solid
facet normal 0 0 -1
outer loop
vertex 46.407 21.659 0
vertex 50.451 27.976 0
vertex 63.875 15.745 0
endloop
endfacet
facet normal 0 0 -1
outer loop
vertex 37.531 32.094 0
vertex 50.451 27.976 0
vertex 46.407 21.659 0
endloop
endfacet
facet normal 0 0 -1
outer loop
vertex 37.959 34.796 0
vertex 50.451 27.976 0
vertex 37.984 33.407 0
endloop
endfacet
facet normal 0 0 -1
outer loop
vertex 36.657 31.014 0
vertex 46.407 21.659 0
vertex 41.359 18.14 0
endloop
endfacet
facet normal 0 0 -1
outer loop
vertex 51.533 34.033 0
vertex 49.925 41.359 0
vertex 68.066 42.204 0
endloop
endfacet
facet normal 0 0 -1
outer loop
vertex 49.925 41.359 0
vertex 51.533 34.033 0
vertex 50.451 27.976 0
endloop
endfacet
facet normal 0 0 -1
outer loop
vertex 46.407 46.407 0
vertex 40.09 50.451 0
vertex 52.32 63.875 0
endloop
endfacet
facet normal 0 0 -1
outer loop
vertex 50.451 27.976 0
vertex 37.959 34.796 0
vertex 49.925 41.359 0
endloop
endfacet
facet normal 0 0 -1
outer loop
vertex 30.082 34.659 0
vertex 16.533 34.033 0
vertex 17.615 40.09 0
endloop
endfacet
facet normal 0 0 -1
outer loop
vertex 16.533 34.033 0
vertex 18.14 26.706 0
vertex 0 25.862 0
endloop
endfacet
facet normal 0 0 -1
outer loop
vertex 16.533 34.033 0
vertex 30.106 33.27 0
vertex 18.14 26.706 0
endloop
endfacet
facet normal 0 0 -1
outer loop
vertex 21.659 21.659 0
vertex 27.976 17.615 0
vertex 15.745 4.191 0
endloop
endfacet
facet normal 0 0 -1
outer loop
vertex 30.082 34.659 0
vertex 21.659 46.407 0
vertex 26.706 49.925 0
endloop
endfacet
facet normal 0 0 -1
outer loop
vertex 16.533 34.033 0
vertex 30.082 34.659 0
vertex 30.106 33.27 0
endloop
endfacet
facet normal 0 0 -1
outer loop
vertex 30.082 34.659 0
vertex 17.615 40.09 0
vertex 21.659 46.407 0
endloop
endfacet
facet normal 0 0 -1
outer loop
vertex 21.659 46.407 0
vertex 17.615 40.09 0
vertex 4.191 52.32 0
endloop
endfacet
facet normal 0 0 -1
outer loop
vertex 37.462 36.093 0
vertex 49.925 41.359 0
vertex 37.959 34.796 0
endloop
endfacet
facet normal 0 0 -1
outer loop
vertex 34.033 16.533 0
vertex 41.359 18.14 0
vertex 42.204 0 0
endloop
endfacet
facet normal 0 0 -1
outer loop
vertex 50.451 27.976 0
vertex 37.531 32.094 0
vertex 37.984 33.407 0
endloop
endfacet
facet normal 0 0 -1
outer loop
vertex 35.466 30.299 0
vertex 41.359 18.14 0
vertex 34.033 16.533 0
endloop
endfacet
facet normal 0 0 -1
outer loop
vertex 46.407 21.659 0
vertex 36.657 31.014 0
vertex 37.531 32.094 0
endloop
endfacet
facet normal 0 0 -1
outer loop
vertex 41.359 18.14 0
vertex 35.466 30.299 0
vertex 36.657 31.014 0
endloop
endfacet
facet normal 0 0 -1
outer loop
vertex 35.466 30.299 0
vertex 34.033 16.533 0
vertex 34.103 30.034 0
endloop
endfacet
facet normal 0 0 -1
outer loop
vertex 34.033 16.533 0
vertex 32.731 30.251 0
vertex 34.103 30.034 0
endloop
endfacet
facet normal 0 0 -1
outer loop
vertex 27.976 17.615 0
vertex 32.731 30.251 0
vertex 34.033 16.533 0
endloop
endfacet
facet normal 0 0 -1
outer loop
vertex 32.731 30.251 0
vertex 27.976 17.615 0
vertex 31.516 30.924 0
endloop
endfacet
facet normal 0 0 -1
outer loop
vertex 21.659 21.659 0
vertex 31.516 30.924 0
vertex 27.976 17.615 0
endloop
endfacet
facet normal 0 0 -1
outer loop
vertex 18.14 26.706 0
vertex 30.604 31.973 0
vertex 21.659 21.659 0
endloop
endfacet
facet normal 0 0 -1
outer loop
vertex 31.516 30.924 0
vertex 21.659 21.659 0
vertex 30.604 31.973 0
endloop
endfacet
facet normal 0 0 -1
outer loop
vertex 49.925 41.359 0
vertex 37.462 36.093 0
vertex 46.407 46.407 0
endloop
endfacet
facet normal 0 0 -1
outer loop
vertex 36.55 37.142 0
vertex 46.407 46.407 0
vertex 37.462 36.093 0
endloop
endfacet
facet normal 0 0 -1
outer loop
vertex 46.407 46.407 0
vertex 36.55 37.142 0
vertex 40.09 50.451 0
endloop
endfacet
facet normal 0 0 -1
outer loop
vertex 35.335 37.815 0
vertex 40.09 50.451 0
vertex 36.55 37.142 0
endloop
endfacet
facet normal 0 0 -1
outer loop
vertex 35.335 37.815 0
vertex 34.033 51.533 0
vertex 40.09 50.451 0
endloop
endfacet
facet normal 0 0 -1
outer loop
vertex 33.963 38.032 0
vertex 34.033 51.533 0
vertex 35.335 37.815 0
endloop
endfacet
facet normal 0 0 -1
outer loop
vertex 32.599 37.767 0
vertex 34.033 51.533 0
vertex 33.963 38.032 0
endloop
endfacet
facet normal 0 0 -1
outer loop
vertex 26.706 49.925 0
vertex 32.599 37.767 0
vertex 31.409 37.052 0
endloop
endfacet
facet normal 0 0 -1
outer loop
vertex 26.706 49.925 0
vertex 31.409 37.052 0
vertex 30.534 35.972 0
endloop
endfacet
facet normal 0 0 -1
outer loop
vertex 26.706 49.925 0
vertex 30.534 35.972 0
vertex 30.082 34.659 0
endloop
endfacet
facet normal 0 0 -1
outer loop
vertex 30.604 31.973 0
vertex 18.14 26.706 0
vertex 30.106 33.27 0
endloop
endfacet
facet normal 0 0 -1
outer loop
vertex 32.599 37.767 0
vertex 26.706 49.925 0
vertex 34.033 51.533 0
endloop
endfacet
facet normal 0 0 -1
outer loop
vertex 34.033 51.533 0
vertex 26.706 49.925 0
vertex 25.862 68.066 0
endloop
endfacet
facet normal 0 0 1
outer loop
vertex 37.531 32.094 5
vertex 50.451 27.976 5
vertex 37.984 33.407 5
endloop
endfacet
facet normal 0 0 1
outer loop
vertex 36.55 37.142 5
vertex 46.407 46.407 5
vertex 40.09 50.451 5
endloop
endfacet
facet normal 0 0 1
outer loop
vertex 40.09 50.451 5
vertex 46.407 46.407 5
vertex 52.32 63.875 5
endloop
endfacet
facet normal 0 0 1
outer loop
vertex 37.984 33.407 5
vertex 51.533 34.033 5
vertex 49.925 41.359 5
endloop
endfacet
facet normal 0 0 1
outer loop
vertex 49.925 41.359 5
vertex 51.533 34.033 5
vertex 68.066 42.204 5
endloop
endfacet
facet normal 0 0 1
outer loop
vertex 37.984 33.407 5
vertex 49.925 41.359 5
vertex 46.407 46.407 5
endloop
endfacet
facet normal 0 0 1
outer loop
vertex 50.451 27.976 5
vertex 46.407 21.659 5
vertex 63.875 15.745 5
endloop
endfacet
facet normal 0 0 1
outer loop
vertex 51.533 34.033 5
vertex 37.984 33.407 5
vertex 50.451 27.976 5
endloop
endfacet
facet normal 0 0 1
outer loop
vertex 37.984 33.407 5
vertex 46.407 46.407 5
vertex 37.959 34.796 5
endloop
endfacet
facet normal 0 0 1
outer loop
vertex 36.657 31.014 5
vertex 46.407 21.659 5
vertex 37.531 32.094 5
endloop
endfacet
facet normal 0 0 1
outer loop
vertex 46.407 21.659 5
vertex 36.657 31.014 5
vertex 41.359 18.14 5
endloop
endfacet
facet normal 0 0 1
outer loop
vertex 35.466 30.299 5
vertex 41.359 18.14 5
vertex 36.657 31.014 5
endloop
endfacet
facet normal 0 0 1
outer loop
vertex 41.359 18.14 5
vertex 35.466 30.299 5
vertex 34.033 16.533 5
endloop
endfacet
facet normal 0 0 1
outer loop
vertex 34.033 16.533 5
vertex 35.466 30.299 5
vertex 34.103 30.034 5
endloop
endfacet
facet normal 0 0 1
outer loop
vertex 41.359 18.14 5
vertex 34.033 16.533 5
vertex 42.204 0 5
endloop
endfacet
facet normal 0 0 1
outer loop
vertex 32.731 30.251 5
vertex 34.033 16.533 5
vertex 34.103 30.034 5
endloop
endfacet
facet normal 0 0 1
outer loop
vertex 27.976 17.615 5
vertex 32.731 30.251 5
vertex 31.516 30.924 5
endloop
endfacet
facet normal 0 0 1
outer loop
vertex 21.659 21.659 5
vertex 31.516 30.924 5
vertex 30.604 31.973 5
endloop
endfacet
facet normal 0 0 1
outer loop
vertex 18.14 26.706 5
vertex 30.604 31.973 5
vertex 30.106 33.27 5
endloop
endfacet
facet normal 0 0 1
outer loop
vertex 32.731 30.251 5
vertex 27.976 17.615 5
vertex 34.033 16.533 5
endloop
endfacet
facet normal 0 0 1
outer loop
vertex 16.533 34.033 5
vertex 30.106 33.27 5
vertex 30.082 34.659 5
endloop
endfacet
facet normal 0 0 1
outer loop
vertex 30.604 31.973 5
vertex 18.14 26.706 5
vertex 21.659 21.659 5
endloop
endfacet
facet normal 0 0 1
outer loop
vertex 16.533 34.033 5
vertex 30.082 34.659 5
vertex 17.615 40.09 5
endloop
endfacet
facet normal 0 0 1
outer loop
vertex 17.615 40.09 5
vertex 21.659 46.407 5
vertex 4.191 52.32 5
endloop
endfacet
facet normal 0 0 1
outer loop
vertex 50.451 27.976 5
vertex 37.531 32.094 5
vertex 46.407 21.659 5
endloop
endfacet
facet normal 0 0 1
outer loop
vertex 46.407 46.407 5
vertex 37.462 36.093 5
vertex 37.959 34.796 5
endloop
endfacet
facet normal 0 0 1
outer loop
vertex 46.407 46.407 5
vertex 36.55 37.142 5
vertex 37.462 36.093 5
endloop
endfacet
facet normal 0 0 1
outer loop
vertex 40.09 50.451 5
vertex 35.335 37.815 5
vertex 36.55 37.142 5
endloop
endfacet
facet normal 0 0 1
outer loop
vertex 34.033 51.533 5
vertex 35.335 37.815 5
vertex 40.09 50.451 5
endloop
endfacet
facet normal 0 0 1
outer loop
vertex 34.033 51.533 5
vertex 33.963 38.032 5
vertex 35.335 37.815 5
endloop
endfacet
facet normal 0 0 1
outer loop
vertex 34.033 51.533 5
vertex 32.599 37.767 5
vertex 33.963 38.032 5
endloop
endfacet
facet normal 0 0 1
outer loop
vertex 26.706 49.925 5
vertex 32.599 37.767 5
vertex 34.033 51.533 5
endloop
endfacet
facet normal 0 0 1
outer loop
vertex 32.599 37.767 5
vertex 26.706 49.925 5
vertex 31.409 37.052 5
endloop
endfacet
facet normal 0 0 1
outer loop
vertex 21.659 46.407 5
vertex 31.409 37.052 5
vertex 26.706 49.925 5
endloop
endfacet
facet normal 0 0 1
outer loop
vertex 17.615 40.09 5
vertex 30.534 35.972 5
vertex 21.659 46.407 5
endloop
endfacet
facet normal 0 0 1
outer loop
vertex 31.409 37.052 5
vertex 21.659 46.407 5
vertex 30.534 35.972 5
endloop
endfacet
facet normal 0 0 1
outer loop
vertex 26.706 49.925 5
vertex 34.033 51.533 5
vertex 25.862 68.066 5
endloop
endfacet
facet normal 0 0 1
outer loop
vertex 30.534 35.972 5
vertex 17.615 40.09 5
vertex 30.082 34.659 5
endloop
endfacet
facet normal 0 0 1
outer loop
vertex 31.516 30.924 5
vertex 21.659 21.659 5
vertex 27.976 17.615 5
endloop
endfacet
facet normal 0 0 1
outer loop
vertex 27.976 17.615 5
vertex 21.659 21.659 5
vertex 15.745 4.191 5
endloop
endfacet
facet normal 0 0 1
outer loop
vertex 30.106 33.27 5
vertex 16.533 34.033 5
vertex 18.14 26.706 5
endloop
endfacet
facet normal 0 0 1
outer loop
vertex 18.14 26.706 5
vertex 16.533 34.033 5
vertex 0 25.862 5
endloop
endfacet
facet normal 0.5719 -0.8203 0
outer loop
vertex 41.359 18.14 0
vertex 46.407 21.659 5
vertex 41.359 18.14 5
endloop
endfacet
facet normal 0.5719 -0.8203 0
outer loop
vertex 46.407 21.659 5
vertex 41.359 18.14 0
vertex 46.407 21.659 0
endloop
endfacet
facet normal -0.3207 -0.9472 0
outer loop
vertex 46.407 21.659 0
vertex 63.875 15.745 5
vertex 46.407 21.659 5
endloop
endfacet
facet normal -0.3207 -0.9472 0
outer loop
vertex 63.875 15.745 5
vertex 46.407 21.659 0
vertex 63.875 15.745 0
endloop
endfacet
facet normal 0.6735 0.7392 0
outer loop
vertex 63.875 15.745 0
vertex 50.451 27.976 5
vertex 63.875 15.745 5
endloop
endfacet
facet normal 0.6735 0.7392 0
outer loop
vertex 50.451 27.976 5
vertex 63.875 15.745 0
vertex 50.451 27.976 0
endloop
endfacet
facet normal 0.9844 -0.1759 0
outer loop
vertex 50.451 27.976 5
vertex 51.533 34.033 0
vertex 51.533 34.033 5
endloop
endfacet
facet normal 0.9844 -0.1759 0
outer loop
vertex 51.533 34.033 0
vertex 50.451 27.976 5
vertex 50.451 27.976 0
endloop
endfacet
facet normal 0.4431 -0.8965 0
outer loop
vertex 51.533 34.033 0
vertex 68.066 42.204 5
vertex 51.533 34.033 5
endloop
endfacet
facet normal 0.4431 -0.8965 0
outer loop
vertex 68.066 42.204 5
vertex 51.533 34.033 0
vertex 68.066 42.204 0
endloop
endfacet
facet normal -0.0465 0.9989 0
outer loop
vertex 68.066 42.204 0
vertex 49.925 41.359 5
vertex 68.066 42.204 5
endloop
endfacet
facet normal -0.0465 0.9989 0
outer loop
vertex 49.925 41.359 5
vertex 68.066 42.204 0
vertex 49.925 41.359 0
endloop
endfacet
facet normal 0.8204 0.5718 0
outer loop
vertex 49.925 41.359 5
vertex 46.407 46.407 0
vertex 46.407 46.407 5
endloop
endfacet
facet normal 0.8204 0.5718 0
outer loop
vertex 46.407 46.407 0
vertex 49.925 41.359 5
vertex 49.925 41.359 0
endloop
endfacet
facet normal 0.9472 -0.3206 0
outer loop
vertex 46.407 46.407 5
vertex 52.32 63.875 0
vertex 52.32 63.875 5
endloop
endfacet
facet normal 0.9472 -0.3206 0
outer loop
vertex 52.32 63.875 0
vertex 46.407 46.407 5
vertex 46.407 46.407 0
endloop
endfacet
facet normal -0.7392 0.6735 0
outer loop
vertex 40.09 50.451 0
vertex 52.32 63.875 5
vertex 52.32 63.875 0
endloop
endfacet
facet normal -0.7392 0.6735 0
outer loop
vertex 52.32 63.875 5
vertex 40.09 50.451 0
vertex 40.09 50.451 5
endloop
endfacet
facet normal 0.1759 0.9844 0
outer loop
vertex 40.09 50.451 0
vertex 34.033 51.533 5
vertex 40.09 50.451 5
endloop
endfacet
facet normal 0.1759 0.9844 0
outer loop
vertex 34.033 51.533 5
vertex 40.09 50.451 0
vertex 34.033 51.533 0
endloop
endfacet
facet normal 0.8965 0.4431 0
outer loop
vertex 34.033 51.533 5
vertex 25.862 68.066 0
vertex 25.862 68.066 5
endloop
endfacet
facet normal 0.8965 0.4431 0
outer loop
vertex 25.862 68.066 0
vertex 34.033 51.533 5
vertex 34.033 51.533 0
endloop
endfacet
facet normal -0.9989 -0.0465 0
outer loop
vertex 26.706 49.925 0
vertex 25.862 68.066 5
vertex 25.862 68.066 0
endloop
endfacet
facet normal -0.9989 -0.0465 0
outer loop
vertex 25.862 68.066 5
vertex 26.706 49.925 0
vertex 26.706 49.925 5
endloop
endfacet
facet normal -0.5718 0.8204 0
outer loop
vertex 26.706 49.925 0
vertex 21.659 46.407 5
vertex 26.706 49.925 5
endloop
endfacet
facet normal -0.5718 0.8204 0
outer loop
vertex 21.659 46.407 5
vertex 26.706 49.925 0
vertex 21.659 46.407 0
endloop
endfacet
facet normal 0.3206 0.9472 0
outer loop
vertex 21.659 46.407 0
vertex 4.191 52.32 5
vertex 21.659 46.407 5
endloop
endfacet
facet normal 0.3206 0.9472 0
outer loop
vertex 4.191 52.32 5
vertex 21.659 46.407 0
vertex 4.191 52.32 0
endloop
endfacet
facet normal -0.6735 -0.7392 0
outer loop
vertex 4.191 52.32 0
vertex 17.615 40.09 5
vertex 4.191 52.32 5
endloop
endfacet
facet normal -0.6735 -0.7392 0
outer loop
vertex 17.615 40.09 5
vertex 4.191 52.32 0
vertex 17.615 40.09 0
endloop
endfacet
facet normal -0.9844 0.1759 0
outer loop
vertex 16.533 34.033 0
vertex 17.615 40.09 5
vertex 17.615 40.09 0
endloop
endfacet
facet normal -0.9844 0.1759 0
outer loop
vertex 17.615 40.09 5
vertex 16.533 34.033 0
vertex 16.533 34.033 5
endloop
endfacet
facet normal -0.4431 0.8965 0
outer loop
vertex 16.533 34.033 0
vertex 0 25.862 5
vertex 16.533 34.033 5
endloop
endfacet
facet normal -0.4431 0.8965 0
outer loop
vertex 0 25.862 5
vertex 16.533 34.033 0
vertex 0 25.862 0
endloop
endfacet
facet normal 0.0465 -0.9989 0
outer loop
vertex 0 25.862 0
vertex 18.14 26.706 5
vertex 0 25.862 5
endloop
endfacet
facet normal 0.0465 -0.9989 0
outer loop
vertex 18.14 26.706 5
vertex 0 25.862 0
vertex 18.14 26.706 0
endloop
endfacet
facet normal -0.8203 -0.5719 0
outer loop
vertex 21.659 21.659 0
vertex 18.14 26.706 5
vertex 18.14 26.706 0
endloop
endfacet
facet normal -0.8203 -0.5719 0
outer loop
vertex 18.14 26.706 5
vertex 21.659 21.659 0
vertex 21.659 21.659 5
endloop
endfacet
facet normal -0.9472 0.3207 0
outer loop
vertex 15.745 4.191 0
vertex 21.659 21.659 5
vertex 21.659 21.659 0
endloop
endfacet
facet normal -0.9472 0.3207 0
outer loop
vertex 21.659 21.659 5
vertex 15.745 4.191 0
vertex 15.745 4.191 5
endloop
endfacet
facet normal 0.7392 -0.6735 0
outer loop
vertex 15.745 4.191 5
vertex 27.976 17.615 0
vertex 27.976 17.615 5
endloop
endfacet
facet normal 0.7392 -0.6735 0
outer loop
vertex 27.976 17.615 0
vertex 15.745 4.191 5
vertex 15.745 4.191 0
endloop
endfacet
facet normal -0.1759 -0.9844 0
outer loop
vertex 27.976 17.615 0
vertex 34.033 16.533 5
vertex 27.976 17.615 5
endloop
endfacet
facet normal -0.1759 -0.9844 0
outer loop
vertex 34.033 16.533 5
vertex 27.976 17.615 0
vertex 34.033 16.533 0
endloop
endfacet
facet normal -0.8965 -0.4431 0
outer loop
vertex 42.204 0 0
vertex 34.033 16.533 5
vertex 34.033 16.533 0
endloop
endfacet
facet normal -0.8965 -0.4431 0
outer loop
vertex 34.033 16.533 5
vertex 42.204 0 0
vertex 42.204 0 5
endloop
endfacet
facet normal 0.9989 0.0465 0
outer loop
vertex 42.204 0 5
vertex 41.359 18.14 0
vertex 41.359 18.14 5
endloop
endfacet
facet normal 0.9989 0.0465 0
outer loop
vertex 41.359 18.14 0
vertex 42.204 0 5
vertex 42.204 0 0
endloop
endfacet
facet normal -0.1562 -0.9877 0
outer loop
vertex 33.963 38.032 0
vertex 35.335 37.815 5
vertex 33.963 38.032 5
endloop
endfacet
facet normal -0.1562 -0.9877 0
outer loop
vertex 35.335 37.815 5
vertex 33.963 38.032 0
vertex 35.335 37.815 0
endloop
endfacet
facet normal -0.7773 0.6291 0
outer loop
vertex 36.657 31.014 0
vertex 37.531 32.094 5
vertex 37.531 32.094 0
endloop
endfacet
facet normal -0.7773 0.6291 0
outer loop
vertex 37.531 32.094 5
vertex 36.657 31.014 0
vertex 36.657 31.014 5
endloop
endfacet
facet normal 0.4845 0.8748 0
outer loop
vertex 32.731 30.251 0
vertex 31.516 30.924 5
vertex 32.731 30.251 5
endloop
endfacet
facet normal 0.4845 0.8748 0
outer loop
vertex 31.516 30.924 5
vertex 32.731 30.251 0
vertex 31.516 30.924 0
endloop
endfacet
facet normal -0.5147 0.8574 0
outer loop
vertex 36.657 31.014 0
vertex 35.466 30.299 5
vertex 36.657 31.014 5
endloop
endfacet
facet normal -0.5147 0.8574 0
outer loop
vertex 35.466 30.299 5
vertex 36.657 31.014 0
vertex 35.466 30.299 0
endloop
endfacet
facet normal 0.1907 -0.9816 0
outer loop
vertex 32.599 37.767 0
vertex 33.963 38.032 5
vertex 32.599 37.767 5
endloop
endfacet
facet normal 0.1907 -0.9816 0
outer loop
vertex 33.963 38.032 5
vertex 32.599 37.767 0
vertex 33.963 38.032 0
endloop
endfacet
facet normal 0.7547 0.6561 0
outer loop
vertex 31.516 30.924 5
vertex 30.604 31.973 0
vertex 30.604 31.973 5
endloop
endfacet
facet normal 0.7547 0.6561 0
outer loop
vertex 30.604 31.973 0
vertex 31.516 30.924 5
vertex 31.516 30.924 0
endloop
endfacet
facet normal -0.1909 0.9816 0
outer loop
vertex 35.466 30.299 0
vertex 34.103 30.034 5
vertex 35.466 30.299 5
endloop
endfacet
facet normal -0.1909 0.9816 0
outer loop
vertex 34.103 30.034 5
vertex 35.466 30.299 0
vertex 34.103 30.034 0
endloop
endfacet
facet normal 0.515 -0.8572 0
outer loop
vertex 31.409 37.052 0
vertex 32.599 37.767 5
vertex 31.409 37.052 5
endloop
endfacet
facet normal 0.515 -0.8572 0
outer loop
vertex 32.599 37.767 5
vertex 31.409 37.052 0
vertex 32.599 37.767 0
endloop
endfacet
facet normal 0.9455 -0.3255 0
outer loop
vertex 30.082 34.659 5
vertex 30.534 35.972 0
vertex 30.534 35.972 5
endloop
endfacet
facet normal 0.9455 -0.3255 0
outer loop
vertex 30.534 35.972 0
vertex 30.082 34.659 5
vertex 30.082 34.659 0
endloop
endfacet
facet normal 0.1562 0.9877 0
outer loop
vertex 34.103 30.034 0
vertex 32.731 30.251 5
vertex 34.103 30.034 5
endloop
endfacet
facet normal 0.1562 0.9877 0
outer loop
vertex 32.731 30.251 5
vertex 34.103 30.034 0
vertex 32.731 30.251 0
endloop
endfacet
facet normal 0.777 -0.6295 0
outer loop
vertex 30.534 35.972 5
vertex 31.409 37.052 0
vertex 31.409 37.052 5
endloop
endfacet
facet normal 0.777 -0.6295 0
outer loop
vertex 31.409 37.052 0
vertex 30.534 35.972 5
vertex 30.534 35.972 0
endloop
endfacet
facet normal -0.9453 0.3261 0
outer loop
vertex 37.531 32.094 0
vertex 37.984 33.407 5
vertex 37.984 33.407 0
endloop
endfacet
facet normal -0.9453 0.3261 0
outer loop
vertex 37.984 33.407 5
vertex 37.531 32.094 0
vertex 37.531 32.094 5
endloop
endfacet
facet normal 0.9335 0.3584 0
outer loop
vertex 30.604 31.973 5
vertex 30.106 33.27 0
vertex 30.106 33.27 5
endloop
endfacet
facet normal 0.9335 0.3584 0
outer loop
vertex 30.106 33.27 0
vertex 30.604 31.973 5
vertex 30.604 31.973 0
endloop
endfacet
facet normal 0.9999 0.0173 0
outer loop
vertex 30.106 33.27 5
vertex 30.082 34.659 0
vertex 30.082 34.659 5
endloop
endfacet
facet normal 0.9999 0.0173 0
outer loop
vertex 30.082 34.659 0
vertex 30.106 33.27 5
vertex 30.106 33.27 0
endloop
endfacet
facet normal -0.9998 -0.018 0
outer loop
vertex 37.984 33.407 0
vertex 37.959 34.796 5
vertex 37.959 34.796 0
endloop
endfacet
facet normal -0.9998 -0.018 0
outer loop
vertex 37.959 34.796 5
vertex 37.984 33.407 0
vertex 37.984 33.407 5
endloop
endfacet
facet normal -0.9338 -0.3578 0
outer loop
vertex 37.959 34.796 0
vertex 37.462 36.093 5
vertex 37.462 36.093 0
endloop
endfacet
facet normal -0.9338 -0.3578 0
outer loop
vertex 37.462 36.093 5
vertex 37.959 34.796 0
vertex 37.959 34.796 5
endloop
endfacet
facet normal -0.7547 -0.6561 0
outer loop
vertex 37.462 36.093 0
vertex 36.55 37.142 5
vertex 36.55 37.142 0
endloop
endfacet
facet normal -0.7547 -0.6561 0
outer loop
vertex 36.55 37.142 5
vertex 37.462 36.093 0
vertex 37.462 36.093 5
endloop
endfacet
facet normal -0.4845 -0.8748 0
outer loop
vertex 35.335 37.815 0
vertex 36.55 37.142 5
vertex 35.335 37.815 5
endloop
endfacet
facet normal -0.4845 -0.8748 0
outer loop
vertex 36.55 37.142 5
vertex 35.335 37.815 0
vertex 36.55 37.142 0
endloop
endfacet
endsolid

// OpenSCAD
$fn = 32;

// ----------------------------------------------------------------------
// Star wheel: 8-point ratchet, R35
// ----------------------------------------------------------------------

// --- parameters (mm) ---
n_points = 8;             // number of points / teeth
r_out = 35;               // tip radius
r_in = 17.5;              // root radius
bore_r = 4;               // centre bore radius
plate_t = 5;              // plate thickness, Z (extrusion height)
bore_d = 8;               // centre bore diameter
fit_tol = 0.05;           // declared fit tolerance (prompt contract)
free_tol = 0.2;           // declared free tolerance (prompt contract)

profile = [[16.533, 34.033], [0, 25.862], [18.14, 26.706], [21.659, 21.659], [15.745, 4.191], [27.976, 17.615], [34.033, 16.533], [42.204, 0], [41.359, 18.14], [46.407, 21.659], [63.875, 15.745], [50.451, 27.976], [51.533, 34.033], [68.066, 42.204], [49.925, 41.359], [46.407, 46.407], [52.32, 63.875], [40.09, 50.451], [34.033, 51.533], [25.862, 68.066], [26.706, 49.925], [21.659, 46.407], [4.191, 52.32], [17.615, 40.09]];  // primary outline, 24 points, counter clockwise
void_1 = [[37.959, 34.796], [37.462, 36.093], [36.55, 37.142], [35.335, 37.815], [33.963, 38.032], [32.599, 37.767], [31.409, 37.052], [30.534, 35.972], [30.082, 34.659], [30.106, 33.27], [30.604, 31.973], [31.516, 30.924], [32.731, 30.251], [34.103, 30.034], [35.466, 30.299], [36.657, 31.014], [37.531, 32.094], [37.984, 33.407]];  // centre bore, 18 points

// --- the one profile operation ---
difference() {
  linear_extrude(height = plate_t) polygon(points = profile);
  translate([0, 0, -1])
    linear_extrude(height = plate_t + 2) polygon(points = void_1);
}
